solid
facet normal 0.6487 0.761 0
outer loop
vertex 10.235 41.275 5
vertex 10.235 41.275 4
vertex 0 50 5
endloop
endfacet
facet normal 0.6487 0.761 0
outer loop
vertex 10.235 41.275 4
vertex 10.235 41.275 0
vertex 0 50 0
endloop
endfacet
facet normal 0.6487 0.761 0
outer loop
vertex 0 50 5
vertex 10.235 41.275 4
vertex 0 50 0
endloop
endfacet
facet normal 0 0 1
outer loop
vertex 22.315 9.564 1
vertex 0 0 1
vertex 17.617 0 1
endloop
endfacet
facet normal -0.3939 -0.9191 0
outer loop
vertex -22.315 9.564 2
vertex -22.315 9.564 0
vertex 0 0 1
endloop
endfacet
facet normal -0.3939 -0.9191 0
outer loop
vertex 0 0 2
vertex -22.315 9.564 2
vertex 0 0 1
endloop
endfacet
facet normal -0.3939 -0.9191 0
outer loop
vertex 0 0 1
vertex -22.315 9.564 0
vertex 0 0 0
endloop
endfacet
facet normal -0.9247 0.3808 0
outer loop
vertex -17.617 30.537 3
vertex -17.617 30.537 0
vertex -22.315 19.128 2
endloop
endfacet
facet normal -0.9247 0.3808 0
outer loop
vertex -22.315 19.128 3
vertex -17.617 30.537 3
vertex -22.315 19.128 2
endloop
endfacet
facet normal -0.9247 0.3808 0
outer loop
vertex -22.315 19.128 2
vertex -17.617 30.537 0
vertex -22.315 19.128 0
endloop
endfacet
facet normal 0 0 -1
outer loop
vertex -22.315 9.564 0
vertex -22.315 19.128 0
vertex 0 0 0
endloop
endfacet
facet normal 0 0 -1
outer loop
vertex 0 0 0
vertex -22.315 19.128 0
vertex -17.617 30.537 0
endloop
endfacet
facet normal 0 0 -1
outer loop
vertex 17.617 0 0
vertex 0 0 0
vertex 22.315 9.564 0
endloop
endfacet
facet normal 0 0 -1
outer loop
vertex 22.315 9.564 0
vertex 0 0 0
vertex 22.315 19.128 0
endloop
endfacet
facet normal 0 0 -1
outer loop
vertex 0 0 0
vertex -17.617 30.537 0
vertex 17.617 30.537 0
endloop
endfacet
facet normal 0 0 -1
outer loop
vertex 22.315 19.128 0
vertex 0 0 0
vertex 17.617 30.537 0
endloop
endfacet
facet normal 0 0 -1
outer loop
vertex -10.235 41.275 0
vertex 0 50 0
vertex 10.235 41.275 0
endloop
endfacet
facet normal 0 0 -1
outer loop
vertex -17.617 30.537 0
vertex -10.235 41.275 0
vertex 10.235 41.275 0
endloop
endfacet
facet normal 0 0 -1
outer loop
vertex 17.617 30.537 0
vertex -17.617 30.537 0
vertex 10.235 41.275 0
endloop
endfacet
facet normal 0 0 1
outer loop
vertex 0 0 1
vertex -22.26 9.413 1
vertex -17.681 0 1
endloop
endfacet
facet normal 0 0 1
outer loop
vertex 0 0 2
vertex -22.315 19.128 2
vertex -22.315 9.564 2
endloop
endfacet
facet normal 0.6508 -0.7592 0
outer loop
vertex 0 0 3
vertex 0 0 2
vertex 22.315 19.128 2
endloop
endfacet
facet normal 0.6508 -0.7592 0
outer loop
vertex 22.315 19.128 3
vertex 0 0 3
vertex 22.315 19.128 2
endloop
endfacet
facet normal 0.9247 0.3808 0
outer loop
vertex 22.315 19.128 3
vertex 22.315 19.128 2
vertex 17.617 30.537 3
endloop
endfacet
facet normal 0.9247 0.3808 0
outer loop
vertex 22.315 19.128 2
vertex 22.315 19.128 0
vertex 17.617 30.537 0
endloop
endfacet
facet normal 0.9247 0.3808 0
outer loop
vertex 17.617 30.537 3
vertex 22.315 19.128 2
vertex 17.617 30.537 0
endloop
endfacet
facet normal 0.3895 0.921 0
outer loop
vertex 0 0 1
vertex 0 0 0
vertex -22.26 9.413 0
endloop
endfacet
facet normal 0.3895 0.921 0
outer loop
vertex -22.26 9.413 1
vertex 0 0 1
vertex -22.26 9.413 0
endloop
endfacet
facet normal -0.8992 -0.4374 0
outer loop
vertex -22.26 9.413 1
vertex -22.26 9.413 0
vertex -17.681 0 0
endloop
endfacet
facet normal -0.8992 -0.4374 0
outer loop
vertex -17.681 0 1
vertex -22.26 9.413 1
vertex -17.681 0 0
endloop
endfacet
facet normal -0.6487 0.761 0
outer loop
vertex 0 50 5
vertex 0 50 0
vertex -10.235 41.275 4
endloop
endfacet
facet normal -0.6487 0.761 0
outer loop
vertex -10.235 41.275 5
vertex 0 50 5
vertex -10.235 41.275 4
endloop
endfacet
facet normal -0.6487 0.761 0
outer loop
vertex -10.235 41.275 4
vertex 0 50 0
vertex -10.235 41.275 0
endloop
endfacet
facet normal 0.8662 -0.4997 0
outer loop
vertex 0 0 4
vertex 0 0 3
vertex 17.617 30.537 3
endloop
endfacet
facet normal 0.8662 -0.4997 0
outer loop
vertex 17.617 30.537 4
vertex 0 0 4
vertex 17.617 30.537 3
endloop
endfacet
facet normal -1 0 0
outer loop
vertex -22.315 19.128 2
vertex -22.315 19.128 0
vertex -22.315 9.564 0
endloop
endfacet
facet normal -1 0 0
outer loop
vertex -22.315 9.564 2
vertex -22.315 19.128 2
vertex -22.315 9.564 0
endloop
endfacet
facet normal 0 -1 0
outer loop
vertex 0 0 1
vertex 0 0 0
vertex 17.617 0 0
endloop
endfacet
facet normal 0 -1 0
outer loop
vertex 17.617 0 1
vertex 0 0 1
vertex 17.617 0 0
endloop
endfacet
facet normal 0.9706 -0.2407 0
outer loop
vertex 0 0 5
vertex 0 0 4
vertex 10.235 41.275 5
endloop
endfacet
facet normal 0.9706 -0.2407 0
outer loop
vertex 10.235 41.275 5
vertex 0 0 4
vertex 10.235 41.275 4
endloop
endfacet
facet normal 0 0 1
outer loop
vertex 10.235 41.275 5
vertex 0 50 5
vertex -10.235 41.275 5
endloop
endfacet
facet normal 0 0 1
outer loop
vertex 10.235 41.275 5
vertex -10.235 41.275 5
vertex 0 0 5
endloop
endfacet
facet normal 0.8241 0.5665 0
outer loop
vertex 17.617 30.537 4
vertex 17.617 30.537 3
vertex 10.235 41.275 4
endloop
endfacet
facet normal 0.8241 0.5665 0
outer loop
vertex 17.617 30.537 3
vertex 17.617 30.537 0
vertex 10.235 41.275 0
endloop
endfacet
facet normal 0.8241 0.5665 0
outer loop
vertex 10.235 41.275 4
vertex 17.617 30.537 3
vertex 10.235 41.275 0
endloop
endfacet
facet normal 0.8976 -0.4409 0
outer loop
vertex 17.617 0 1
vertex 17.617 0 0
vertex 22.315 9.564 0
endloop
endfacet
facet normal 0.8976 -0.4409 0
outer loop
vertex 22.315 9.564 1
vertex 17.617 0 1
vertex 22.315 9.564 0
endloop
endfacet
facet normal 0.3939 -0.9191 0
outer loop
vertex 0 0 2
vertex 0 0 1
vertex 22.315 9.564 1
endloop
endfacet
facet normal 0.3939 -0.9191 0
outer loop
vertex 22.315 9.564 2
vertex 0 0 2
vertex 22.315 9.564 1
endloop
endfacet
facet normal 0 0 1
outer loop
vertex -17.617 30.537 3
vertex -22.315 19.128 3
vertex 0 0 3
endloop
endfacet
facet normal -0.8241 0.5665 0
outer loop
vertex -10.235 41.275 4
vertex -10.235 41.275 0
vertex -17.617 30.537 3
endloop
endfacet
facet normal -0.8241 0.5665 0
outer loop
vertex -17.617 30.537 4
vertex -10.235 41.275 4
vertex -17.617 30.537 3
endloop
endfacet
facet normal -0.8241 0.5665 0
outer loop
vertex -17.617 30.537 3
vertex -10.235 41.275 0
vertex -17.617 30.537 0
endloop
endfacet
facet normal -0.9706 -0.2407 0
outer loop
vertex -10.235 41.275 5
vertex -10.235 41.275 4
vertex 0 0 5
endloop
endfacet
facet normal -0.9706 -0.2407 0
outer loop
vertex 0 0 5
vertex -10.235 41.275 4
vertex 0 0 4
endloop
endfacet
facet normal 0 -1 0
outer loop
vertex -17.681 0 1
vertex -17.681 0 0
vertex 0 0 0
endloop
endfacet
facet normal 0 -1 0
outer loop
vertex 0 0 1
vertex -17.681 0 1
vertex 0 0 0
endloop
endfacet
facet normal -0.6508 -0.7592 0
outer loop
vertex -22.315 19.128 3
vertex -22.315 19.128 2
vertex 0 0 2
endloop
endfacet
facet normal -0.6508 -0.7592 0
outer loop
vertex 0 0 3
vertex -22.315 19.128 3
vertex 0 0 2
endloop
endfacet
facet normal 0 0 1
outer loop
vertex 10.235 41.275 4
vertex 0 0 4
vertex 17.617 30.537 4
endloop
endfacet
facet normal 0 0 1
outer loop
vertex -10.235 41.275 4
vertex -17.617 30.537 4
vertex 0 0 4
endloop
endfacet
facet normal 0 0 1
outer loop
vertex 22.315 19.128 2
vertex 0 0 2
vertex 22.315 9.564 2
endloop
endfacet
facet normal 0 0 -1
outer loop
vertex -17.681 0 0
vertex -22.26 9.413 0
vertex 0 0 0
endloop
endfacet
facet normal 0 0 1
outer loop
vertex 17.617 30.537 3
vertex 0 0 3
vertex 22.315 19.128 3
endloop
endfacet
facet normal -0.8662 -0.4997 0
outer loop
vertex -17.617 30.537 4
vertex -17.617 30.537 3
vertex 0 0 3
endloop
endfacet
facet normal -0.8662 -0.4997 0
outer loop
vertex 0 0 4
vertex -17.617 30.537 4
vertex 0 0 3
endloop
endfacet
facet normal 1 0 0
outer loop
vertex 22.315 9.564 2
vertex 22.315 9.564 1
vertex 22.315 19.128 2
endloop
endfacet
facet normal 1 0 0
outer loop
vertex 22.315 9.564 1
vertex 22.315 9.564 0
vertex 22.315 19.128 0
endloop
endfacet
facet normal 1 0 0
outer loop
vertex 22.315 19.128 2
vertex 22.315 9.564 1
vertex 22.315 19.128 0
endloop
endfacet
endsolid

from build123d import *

# Parameters (mm, degrees)
F2_DEPTH  = 1
F4_DEPTH  = 2
F6_DEPTH  = 3
F8_DEPTH  = 4
F9_DEPTH  = 5
F10_DEPTH = 5
F11_DEPTH = 4
F12_DEPTH = 3
F13_DEPTH = 2
F14_DEPTH = 1


with BuildPart() as f2:
    # F1 (on Top) → F2 (new body)
    with BuildSketch(Plane.XY):
        Polygon((-17.681066, 0), (0, 0), (-22.260336, 9.412942), align=None)
    extrude(amount=F2_DEPTH)



with BuildPart() as f4:
    # F0 (on Top) → F4 (new body)
    with BuildSketch(Plane.XY):
        Polygon((-22.315434, 9.563758), (0, 0), (-22.315434, 19.127516), align=None)
    extrude(amount=F4_DEPTH)


with BuildPart() as f2_1:
    add(f2.part)

    add(f4.part)  # F6 merges F4
    # F0 (on Top) → F6 (join)
    with BuildSketch(Plane.XY):
        Polygon((-22.315434, 19.127516), (0, 0), (-17.617453, 30.536912), align=None)
    extrude(amount=F6_DEPTH)

    # F7 (on face) → F8 (join)
    with BuildSketch(Plane.XY):
        Polygon((-10.234896, 41.275169), (-17.617453, 30.536912), (0, 0), align=None)
    extrude(amount=F8_DEPTH)

    # F0 (on Top) → F9 (join)
    with BuildSketch(Plane.XY):
        Polygon((-10.234896, 41.275169), (0, 0), (0, 50), align=None)
    extrude(amount=F9_DEPTH)

    # F0 (on Top) → F10 (join)
    with BuildSketch(Plane.XY):
        Polygon((0, 50), (0, 0), (10.234896, 41.275169), align=None)
    extrude(amount=F10_DEPTH)

    # F0 (on Top) → F11 (join)
    with BuildSketch(Plane.XY):
        Polygon((10.234896, 41.275169), (0, 0), (17.617453, 30.536912), align=None)
    extrude(amount=F11_DEPTH)

    # F0 (on Top) → F12 (join)
    with BuildSketch(Plane.XY):
        Polygon((17.617453, 30.536912), (0, 0), (22.315434, 19.127516), align=None)
    extrude(amount=F12_DEPTH)

    # F0 (on Top) → F13 (join)
    with BuildSketch(Plane.XY):
        Polygon((22.315434, 19.127516), (0, 0), (22.315434, 9.563758), align=None)
    extrude(amount=F13_DEPTH)

    # F0 (on Top) → F14 (join)
    with BuildSketch(Plane.XY):
        Polygon((22.315434, 9.563758), (0, 0), (17.617453, 0), align=None)
    extrude(amount=F14_DEPTH)


solid = f2_1.part
